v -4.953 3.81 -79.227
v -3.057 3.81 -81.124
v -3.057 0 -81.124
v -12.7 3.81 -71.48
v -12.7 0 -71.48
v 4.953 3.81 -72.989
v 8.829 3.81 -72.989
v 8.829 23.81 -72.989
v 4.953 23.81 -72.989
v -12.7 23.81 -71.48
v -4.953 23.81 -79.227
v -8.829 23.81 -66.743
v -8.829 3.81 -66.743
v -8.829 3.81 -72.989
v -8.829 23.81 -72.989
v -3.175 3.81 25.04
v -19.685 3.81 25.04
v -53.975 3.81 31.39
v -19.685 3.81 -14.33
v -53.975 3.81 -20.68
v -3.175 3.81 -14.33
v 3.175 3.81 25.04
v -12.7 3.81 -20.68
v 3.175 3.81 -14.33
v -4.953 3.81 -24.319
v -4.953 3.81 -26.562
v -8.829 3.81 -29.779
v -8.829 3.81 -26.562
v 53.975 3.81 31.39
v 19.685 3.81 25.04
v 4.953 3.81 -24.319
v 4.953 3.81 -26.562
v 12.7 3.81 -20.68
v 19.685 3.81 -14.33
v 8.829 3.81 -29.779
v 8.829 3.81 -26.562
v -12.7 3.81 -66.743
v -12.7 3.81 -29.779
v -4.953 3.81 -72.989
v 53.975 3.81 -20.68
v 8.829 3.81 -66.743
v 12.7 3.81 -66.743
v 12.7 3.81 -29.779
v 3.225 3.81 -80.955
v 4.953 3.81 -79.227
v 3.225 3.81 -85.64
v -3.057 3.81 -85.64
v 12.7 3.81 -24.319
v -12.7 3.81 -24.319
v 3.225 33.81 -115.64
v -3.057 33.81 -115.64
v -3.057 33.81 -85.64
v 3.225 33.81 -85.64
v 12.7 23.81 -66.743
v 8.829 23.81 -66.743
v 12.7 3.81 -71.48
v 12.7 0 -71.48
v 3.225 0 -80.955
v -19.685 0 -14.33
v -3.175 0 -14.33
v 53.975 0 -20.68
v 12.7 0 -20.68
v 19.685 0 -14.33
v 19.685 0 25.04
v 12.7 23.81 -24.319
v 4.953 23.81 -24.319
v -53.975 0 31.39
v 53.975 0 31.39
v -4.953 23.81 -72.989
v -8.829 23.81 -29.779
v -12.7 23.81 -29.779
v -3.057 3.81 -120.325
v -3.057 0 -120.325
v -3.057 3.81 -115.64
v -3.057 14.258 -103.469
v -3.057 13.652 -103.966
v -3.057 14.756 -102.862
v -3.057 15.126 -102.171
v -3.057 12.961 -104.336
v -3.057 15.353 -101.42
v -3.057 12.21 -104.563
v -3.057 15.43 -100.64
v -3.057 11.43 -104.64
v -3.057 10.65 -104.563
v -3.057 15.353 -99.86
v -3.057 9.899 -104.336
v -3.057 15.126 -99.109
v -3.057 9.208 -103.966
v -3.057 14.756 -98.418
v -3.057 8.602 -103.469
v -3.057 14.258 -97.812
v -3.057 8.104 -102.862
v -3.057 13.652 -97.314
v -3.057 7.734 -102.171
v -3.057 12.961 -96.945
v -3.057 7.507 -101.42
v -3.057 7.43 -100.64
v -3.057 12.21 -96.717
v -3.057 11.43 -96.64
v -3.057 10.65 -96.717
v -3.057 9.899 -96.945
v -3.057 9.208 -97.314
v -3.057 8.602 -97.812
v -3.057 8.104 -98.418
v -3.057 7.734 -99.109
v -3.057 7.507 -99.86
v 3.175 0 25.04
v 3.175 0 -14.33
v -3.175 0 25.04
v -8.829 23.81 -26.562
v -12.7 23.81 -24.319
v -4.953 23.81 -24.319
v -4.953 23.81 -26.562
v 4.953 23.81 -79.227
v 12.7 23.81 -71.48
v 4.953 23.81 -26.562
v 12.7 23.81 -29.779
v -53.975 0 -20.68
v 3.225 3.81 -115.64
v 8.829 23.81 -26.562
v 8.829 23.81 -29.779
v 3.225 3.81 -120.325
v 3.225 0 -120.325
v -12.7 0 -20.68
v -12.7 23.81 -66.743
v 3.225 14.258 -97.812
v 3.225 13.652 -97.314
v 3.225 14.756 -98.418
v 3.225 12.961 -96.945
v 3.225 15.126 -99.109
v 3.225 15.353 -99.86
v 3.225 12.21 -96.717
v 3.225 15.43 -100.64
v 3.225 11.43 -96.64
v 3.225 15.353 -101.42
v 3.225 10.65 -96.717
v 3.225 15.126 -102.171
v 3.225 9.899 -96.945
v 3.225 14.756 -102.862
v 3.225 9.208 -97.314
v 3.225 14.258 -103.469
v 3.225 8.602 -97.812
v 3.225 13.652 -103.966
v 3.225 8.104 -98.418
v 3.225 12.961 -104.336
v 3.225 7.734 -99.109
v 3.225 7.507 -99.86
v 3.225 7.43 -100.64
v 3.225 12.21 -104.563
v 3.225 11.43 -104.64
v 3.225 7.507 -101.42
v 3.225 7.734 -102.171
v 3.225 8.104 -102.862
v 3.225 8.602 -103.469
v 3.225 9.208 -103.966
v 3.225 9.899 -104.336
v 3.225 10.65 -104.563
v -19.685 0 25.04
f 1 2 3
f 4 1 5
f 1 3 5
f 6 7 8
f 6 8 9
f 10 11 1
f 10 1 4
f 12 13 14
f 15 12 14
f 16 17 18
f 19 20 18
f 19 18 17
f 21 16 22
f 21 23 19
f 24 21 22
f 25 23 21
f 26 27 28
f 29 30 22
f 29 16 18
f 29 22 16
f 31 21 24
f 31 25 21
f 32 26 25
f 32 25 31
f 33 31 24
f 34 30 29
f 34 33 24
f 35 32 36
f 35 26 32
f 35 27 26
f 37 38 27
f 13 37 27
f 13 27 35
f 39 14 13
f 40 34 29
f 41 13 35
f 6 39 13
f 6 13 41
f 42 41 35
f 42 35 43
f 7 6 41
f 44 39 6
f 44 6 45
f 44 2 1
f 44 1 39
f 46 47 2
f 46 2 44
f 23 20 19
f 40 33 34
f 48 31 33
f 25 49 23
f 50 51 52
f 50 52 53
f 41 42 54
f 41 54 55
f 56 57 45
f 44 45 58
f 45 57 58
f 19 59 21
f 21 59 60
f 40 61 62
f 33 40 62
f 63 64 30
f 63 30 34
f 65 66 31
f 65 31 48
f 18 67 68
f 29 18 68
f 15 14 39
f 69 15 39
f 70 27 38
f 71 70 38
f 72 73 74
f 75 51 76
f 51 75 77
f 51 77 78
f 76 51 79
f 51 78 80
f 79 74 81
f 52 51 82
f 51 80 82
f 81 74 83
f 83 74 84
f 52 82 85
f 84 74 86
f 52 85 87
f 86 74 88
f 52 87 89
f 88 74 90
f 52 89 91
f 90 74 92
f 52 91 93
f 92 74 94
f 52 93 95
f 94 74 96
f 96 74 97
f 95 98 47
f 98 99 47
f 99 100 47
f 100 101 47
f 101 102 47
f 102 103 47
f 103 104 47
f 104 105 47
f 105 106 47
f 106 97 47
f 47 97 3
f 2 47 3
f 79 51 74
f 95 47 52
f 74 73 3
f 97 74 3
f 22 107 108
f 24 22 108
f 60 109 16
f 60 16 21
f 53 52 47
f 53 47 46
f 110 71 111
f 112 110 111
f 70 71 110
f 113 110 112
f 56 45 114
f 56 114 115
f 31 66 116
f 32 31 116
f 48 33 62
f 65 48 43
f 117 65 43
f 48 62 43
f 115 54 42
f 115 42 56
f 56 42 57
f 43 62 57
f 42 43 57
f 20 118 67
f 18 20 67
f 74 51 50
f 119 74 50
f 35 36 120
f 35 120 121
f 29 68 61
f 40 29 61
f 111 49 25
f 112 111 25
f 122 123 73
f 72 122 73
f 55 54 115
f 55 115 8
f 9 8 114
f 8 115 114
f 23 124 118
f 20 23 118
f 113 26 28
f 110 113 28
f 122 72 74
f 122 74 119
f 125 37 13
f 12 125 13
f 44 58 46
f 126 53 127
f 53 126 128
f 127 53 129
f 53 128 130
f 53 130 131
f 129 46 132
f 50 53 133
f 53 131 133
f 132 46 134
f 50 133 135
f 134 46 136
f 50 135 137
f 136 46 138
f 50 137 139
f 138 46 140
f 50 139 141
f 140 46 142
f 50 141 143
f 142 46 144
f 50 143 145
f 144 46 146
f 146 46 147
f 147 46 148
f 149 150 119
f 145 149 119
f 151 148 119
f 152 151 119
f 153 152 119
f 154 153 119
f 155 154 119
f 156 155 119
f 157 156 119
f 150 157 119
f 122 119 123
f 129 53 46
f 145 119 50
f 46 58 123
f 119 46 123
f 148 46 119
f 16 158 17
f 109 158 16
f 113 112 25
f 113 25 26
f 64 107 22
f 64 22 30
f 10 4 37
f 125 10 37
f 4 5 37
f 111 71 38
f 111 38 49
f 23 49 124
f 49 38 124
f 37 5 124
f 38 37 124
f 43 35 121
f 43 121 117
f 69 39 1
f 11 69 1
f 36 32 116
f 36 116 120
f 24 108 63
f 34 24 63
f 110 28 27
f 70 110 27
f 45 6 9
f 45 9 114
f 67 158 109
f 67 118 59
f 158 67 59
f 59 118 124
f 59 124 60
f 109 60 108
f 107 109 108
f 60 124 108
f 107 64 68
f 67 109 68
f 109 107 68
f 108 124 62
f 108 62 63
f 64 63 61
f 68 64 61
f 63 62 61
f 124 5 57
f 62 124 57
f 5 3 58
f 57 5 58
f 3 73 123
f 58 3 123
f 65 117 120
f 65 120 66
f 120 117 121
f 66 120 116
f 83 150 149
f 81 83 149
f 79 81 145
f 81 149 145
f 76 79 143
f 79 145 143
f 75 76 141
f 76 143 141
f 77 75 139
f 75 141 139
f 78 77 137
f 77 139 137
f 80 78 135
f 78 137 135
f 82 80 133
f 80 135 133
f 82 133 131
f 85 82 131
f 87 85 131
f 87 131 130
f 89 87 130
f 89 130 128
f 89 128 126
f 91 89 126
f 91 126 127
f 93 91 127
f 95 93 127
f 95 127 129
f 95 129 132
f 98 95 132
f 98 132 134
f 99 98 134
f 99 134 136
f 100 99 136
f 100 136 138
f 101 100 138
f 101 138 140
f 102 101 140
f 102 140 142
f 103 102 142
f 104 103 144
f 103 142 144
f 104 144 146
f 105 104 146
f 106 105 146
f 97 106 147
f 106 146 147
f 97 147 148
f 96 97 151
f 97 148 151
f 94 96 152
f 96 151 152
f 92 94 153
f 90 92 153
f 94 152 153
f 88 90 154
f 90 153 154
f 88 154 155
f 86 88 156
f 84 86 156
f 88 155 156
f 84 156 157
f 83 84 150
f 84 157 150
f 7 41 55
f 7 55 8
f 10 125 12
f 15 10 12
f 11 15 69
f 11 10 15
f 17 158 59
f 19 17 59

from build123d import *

# Parameters (mm, degrees)
SKETCH1_W           = 16.51
SKETCH1_H           = 39.37
BOSS_EXTRUDE1_DEPTH = 3.81
SKETCH2_W           = 6.281845558
SKETCH2_H           = 29.999999944
BOSS_EXTRUDE2_DEPTH = 30
CUT_EXTRUDE1_REACH  = 59.2
SKETCH3_R           = 4
BOSS_EXTRUDE3_DEPTH = 20


with BuildPart() as part:
    # Sketch1 → Boss-Extrude1 (new body)
    with BuildSketch(Plane(origin=(0, 0, 0), x_dir=(1, 0, 0), z_dir=(0, 1, 0))):
        Polygon((-53.975, 20.680273282), (-53.975, -31.389726718), (53.975, -31.389726718), (53.975, 20.680273282), (12.7, 20.680273282), (12.7, 71.480273282), (3.225157137, 80.955116145), (3.225157137, 120.325116145), (-3.056688421, 120.325116145), (-3.056688421, 81.123584861), (-12.7, 71.480273282), (-12.7, 20.680273282), align=None)
        with Locations((-11.43, -5.354726718)):
            Rectangle(SKETCH1_W, SKETCH1_H, mode=Mode.SUBTRACT)
        with Locations((11.43, -5.354726718)):
            Rectangle(SKETCH1_W, SKETCH1_H, mode=Mode.SUBTRACT)
    extrude(amount=BOSS_EXTRUDE1_DEPTH)

    # Sketch2 → Boss-Extrude2 (add)
    with BuildSketch(Plane(origin=(0, 3.81, 0), x_dir=(1, 0, 0), z_dir=(0, 1, 0))):
        with Locations((0.084234358, 100.640116145)):
            Rectangle(SKETCH2_W, SKETCH2_H)
    extrude(amount=BOSS_EXTRUDE2_DEPTH)

    # Sketch3 → Cut-Extrude1 (cut, up to next)
    with BuildSketch(Plane(origin=(3.225157137, 0, 0), x_dir=(0, 0, -1), z_dir=(1, 0, 0)), mode=Mode.PRIVATE) as cut_extrude1_sk1:
        with Locations((100.640116145, 11.43)):
            Circle(SKETCH3_R)
    cut_extrude1_tool1 = extrude(cut_extrude1_sk1.sketch, amount=-CUT_EXTRUDE1_REACH, mode=Mode.PRIVATE) & part.part
    add(cut_extrude1_tool1.solids().sort_by_distance((3.225157, 11.43, -100.640116))[0], mode=Mode.SUBTRACT)

    # Sketch6 → Boss-Extrude3 (add)
    with BuildSketch(Plane(origin=(0, 3.81, 0), x_dir=(1, 0, 0), z_dir=(0, 1, 0))):
        Polygon((-8.128, 24.319391954), (-4.952973996, 24.319391954), (-4.952973996, 26.561602149), (-8.829142948, 26.561602149), (-8.829142948, 29.779456866), (-12.7, 29.779456866), (-12.7, 24.319391954), align=None)
        Polygon((12.7, 24.319391954), (8.128, 24.319391954), (4.952973996, 24.319391954), (4.952973996, 26.561602149), (8.829142948, 26.561602149), (8.829142948, 29.779456866), (12.7, 29.779456866), align=None)
        Polygon((-4.952973996, 79.227299287), (-12.7, 71.480273282), (-12.7, 66.743012955), (-8.829142948, 66.743012955), (-8.829142948, 72.988681503), (-4.952973996, 72.988681503), align=None)
        Polygon((4.952973996, 72.988681503), (4.952973996, 79.227299287), (12.7, 71.480273282), (12.7, 66.743012955), (8.829142948, 66.743012955), (8.829142948, 72.988681503), align=None)
    extrude(amount=BOSS_EXTRUDE3_DEPTH)


solid = part.part
